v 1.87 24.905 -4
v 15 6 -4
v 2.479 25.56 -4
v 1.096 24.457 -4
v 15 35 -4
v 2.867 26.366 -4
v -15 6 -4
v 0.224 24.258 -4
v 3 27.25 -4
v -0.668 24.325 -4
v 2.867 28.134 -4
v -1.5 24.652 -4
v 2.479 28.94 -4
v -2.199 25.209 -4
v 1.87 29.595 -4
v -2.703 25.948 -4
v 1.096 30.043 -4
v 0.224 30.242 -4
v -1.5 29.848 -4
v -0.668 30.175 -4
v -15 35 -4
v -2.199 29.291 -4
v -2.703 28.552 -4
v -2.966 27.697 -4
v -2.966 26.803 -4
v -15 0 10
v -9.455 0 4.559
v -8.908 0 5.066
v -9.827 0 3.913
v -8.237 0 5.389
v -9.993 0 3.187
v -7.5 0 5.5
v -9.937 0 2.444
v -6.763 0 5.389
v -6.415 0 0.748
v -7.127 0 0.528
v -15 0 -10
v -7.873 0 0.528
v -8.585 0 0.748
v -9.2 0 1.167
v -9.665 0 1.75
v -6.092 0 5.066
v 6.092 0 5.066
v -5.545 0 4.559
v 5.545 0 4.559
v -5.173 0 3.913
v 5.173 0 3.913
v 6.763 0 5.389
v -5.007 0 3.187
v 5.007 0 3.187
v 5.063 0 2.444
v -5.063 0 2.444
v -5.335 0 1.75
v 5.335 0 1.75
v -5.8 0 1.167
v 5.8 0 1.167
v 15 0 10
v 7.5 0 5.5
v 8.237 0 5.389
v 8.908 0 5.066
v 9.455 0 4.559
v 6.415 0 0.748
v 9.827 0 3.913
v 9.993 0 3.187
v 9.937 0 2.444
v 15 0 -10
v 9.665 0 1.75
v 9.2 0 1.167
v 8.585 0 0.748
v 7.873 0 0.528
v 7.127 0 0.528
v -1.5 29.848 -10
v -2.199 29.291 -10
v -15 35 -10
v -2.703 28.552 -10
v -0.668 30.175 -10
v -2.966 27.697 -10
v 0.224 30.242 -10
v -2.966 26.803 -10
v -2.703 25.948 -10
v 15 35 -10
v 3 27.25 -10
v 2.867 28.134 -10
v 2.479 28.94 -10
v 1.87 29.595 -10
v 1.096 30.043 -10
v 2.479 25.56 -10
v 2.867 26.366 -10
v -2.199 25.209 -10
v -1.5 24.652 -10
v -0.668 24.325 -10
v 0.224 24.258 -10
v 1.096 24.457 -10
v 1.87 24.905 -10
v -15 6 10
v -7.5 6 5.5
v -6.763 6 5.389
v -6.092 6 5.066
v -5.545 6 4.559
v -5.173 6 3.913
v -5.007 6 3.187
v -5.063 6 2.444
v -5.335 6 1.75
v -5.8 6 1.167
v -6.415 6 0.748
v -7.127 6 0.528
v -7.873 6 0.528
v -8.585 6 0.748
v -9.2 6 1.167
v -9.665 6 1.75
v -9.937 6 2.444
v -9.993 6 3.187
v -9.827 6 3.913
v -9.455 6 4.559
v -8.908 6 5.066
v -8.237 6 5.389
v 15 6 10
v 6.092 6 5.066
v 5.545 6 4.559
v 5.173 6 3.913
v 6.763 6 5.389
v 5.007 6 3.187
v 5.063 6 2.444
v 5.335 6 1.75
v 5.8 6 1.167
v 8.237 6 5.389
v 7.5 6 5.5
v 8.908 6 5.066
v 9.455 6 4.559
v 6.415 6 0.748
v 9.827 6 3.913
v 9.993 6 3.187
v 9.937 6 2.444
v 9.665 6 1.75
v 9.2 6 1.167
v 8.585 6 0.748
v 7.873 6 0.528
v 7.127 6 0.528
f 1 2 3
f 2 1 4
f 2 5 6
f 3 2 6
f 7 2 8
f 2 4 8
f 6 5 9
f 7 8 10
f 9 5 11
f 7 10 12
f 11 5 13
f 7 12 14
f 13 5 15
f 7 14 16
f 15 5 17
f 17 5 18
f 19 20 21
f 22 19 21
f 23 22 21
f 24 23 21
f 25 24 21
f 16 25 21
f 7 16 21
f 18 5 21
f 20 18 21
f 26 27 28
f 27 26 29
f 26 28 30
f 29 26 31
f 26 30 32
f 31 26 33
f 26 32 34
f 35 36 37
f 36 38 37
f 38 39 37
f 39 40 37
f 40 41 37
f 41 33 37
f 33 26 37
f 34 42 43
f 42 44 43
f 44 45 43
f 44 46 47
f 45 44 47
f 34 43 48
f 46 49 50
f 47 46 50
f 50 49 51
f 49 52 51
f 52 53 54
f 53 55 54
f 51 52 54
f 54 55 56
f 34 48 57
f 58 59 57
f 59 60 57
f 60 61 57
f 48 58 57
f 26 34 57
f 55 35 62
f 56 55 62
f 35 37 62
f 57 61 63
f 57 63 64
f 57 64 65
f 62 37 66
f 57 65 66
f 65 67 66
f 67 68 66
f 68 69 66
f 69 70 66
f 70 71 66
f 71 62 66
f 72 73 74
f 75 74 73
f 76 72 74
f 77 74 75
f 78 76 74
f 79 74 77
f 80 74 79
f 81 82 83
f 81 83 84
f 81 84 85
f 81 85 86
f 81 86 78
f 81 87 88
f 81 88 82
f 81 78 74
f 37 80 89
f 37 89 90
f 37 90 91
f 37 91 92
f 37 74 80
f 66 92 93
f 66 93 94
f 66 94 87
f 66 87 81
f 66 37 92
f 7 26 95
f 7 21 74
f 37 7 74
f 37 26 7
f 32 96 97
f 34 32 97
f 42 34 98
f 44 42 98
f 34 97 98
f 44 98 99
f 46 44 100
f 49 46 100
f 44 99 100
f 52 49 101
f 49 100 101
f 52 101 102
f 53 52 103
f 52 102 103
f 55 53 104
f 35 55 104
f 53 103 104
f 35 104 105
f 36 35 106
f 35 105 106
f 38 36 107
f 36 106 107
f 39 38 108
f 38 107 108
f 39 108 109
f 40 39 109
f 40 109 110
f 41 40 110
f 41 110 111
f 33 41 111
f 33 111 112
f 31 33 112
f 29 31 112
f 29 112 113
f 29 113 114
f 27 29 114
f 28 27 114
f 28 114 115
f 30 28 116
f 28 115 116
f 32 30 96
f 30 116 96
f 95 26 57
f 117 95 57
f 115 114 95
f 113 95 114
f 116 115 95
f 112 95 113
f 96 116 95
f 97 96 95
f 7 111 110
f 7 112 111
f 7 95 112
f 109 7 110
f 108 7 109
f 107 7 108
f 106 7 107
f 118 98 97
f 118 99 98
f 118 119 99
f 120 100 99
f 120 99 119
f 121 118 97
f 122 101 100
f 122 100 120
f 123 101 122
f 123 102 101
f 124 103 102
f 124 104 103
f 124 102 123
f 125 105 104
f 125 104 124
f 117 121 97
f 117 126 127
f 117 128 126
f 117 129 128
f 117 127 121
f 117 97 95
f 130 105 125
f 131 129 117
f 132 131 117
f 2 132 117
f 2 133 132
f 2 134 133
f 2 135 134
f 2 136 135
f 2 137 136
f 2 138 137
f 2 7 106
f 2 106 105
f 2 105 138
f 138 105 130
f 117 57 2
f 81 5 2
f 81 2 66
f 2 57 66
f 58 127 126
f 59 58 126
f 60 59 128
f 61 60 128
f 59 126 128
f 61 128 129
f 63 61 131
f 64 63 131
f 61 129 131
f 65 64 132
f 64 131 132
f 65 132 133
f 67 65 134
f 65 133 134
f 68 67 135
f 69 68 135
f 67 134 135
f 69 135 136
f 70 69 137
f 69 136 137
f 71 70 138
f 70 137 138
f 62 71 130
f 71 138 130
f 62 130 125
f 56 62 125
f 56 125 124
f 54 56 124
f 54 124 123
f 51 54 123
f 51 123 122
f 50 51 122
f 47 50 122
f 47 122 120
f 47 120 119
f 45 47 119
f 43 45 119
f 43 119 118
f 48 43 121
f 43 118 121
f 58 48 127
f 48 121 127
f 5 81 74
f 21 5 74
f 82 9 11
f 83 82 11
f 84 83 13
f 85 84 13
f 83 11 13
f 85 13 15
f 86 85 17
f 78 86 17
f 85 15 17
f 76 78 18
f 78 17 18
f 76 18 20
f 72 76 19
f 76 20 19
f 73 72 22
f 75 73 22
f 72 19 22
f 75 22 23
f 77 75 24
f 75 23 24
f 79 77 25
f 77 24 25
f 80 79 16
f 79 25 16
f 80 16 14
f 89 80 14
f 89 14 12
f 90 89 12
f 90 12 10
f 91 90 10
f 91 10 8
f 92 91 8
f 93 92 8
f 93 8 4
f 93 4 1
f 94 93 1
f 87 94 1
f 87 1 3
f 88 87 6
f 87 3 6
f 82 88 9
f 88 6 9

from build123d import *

# Parameters (mm, degrees)
CROQUIS1_W              = 30
CROQUIS1_H              = 20
SALIENTE_EXTRUIR1_DEPTH = 6
CROQUIS2_W              = 30
CROQUIS2_H              = 35
SALIENTE_EXTRUIR2_DEPTH = 6
CROQUIS3_R              = 3
CORTAR_EXTRUIR1_DEPTH   = 6
CROQUIS4_R              = 2.5
CORTAR_EXTRUIR2_DEPTH   = 6


with BuildPart() as part:
    # Croquis1 → Saliente-Extruir1 (new body)
    with BuildSketch(Plane(origin=(0, 0, 0), x_dir=(1, 0, 0), z_dir=(0, 1, 0))):
        Rectangle(CROQUIS1_W, CROQUIS1_H)
    extrude(amount=SALIENTE_EXTRUIR1_DEPTH)

    # Croquis2 → Saliente-Extruir2 (add)
    with BuildSketch(Plane(origin=(0, 0, -10), x_dir=(-1, 0, 0), z_dir=(0, 0, -1))):
        with Locations((0, 17.5)):
            Rectangle(CROQUIS2_W, CROQUIS2_H)
    extrude(amount=-SALIENTE_EXTRUIR2_DEPTH)

    # Croquis3 → Cortar-Extruir1 (cut)
    with BuildSketch(Plane.XY.offset(-4)):
        with Locations((0, 27.25)):
            Circle(CROQUIS3_R)
    extrude(amount=-CORTAR_EXTRUIR1_DEPTH, mode=Mode.SUBTRACT)

    # Croquis4 → Cortar-Extruir2 (cut)
    with BuildSketch(Plane(origin=(0, 6, 0), x_dir=(1, 0, 0), z_dir=(0, 1, 0))):
        with Locations(Location((-7.5, -3, 0), (0, 0, 270))):
            Circle(CROQUIS4_R)
        with Locations(Location((7.5, -3, 0), (0, 0, 270))):
            Circle(CROQUIS4_R)
    extrude(amount=-CORTAR_EXTRUIR2_DEPTH, mode=Mode.SUBTRACT)


solid = part.part
